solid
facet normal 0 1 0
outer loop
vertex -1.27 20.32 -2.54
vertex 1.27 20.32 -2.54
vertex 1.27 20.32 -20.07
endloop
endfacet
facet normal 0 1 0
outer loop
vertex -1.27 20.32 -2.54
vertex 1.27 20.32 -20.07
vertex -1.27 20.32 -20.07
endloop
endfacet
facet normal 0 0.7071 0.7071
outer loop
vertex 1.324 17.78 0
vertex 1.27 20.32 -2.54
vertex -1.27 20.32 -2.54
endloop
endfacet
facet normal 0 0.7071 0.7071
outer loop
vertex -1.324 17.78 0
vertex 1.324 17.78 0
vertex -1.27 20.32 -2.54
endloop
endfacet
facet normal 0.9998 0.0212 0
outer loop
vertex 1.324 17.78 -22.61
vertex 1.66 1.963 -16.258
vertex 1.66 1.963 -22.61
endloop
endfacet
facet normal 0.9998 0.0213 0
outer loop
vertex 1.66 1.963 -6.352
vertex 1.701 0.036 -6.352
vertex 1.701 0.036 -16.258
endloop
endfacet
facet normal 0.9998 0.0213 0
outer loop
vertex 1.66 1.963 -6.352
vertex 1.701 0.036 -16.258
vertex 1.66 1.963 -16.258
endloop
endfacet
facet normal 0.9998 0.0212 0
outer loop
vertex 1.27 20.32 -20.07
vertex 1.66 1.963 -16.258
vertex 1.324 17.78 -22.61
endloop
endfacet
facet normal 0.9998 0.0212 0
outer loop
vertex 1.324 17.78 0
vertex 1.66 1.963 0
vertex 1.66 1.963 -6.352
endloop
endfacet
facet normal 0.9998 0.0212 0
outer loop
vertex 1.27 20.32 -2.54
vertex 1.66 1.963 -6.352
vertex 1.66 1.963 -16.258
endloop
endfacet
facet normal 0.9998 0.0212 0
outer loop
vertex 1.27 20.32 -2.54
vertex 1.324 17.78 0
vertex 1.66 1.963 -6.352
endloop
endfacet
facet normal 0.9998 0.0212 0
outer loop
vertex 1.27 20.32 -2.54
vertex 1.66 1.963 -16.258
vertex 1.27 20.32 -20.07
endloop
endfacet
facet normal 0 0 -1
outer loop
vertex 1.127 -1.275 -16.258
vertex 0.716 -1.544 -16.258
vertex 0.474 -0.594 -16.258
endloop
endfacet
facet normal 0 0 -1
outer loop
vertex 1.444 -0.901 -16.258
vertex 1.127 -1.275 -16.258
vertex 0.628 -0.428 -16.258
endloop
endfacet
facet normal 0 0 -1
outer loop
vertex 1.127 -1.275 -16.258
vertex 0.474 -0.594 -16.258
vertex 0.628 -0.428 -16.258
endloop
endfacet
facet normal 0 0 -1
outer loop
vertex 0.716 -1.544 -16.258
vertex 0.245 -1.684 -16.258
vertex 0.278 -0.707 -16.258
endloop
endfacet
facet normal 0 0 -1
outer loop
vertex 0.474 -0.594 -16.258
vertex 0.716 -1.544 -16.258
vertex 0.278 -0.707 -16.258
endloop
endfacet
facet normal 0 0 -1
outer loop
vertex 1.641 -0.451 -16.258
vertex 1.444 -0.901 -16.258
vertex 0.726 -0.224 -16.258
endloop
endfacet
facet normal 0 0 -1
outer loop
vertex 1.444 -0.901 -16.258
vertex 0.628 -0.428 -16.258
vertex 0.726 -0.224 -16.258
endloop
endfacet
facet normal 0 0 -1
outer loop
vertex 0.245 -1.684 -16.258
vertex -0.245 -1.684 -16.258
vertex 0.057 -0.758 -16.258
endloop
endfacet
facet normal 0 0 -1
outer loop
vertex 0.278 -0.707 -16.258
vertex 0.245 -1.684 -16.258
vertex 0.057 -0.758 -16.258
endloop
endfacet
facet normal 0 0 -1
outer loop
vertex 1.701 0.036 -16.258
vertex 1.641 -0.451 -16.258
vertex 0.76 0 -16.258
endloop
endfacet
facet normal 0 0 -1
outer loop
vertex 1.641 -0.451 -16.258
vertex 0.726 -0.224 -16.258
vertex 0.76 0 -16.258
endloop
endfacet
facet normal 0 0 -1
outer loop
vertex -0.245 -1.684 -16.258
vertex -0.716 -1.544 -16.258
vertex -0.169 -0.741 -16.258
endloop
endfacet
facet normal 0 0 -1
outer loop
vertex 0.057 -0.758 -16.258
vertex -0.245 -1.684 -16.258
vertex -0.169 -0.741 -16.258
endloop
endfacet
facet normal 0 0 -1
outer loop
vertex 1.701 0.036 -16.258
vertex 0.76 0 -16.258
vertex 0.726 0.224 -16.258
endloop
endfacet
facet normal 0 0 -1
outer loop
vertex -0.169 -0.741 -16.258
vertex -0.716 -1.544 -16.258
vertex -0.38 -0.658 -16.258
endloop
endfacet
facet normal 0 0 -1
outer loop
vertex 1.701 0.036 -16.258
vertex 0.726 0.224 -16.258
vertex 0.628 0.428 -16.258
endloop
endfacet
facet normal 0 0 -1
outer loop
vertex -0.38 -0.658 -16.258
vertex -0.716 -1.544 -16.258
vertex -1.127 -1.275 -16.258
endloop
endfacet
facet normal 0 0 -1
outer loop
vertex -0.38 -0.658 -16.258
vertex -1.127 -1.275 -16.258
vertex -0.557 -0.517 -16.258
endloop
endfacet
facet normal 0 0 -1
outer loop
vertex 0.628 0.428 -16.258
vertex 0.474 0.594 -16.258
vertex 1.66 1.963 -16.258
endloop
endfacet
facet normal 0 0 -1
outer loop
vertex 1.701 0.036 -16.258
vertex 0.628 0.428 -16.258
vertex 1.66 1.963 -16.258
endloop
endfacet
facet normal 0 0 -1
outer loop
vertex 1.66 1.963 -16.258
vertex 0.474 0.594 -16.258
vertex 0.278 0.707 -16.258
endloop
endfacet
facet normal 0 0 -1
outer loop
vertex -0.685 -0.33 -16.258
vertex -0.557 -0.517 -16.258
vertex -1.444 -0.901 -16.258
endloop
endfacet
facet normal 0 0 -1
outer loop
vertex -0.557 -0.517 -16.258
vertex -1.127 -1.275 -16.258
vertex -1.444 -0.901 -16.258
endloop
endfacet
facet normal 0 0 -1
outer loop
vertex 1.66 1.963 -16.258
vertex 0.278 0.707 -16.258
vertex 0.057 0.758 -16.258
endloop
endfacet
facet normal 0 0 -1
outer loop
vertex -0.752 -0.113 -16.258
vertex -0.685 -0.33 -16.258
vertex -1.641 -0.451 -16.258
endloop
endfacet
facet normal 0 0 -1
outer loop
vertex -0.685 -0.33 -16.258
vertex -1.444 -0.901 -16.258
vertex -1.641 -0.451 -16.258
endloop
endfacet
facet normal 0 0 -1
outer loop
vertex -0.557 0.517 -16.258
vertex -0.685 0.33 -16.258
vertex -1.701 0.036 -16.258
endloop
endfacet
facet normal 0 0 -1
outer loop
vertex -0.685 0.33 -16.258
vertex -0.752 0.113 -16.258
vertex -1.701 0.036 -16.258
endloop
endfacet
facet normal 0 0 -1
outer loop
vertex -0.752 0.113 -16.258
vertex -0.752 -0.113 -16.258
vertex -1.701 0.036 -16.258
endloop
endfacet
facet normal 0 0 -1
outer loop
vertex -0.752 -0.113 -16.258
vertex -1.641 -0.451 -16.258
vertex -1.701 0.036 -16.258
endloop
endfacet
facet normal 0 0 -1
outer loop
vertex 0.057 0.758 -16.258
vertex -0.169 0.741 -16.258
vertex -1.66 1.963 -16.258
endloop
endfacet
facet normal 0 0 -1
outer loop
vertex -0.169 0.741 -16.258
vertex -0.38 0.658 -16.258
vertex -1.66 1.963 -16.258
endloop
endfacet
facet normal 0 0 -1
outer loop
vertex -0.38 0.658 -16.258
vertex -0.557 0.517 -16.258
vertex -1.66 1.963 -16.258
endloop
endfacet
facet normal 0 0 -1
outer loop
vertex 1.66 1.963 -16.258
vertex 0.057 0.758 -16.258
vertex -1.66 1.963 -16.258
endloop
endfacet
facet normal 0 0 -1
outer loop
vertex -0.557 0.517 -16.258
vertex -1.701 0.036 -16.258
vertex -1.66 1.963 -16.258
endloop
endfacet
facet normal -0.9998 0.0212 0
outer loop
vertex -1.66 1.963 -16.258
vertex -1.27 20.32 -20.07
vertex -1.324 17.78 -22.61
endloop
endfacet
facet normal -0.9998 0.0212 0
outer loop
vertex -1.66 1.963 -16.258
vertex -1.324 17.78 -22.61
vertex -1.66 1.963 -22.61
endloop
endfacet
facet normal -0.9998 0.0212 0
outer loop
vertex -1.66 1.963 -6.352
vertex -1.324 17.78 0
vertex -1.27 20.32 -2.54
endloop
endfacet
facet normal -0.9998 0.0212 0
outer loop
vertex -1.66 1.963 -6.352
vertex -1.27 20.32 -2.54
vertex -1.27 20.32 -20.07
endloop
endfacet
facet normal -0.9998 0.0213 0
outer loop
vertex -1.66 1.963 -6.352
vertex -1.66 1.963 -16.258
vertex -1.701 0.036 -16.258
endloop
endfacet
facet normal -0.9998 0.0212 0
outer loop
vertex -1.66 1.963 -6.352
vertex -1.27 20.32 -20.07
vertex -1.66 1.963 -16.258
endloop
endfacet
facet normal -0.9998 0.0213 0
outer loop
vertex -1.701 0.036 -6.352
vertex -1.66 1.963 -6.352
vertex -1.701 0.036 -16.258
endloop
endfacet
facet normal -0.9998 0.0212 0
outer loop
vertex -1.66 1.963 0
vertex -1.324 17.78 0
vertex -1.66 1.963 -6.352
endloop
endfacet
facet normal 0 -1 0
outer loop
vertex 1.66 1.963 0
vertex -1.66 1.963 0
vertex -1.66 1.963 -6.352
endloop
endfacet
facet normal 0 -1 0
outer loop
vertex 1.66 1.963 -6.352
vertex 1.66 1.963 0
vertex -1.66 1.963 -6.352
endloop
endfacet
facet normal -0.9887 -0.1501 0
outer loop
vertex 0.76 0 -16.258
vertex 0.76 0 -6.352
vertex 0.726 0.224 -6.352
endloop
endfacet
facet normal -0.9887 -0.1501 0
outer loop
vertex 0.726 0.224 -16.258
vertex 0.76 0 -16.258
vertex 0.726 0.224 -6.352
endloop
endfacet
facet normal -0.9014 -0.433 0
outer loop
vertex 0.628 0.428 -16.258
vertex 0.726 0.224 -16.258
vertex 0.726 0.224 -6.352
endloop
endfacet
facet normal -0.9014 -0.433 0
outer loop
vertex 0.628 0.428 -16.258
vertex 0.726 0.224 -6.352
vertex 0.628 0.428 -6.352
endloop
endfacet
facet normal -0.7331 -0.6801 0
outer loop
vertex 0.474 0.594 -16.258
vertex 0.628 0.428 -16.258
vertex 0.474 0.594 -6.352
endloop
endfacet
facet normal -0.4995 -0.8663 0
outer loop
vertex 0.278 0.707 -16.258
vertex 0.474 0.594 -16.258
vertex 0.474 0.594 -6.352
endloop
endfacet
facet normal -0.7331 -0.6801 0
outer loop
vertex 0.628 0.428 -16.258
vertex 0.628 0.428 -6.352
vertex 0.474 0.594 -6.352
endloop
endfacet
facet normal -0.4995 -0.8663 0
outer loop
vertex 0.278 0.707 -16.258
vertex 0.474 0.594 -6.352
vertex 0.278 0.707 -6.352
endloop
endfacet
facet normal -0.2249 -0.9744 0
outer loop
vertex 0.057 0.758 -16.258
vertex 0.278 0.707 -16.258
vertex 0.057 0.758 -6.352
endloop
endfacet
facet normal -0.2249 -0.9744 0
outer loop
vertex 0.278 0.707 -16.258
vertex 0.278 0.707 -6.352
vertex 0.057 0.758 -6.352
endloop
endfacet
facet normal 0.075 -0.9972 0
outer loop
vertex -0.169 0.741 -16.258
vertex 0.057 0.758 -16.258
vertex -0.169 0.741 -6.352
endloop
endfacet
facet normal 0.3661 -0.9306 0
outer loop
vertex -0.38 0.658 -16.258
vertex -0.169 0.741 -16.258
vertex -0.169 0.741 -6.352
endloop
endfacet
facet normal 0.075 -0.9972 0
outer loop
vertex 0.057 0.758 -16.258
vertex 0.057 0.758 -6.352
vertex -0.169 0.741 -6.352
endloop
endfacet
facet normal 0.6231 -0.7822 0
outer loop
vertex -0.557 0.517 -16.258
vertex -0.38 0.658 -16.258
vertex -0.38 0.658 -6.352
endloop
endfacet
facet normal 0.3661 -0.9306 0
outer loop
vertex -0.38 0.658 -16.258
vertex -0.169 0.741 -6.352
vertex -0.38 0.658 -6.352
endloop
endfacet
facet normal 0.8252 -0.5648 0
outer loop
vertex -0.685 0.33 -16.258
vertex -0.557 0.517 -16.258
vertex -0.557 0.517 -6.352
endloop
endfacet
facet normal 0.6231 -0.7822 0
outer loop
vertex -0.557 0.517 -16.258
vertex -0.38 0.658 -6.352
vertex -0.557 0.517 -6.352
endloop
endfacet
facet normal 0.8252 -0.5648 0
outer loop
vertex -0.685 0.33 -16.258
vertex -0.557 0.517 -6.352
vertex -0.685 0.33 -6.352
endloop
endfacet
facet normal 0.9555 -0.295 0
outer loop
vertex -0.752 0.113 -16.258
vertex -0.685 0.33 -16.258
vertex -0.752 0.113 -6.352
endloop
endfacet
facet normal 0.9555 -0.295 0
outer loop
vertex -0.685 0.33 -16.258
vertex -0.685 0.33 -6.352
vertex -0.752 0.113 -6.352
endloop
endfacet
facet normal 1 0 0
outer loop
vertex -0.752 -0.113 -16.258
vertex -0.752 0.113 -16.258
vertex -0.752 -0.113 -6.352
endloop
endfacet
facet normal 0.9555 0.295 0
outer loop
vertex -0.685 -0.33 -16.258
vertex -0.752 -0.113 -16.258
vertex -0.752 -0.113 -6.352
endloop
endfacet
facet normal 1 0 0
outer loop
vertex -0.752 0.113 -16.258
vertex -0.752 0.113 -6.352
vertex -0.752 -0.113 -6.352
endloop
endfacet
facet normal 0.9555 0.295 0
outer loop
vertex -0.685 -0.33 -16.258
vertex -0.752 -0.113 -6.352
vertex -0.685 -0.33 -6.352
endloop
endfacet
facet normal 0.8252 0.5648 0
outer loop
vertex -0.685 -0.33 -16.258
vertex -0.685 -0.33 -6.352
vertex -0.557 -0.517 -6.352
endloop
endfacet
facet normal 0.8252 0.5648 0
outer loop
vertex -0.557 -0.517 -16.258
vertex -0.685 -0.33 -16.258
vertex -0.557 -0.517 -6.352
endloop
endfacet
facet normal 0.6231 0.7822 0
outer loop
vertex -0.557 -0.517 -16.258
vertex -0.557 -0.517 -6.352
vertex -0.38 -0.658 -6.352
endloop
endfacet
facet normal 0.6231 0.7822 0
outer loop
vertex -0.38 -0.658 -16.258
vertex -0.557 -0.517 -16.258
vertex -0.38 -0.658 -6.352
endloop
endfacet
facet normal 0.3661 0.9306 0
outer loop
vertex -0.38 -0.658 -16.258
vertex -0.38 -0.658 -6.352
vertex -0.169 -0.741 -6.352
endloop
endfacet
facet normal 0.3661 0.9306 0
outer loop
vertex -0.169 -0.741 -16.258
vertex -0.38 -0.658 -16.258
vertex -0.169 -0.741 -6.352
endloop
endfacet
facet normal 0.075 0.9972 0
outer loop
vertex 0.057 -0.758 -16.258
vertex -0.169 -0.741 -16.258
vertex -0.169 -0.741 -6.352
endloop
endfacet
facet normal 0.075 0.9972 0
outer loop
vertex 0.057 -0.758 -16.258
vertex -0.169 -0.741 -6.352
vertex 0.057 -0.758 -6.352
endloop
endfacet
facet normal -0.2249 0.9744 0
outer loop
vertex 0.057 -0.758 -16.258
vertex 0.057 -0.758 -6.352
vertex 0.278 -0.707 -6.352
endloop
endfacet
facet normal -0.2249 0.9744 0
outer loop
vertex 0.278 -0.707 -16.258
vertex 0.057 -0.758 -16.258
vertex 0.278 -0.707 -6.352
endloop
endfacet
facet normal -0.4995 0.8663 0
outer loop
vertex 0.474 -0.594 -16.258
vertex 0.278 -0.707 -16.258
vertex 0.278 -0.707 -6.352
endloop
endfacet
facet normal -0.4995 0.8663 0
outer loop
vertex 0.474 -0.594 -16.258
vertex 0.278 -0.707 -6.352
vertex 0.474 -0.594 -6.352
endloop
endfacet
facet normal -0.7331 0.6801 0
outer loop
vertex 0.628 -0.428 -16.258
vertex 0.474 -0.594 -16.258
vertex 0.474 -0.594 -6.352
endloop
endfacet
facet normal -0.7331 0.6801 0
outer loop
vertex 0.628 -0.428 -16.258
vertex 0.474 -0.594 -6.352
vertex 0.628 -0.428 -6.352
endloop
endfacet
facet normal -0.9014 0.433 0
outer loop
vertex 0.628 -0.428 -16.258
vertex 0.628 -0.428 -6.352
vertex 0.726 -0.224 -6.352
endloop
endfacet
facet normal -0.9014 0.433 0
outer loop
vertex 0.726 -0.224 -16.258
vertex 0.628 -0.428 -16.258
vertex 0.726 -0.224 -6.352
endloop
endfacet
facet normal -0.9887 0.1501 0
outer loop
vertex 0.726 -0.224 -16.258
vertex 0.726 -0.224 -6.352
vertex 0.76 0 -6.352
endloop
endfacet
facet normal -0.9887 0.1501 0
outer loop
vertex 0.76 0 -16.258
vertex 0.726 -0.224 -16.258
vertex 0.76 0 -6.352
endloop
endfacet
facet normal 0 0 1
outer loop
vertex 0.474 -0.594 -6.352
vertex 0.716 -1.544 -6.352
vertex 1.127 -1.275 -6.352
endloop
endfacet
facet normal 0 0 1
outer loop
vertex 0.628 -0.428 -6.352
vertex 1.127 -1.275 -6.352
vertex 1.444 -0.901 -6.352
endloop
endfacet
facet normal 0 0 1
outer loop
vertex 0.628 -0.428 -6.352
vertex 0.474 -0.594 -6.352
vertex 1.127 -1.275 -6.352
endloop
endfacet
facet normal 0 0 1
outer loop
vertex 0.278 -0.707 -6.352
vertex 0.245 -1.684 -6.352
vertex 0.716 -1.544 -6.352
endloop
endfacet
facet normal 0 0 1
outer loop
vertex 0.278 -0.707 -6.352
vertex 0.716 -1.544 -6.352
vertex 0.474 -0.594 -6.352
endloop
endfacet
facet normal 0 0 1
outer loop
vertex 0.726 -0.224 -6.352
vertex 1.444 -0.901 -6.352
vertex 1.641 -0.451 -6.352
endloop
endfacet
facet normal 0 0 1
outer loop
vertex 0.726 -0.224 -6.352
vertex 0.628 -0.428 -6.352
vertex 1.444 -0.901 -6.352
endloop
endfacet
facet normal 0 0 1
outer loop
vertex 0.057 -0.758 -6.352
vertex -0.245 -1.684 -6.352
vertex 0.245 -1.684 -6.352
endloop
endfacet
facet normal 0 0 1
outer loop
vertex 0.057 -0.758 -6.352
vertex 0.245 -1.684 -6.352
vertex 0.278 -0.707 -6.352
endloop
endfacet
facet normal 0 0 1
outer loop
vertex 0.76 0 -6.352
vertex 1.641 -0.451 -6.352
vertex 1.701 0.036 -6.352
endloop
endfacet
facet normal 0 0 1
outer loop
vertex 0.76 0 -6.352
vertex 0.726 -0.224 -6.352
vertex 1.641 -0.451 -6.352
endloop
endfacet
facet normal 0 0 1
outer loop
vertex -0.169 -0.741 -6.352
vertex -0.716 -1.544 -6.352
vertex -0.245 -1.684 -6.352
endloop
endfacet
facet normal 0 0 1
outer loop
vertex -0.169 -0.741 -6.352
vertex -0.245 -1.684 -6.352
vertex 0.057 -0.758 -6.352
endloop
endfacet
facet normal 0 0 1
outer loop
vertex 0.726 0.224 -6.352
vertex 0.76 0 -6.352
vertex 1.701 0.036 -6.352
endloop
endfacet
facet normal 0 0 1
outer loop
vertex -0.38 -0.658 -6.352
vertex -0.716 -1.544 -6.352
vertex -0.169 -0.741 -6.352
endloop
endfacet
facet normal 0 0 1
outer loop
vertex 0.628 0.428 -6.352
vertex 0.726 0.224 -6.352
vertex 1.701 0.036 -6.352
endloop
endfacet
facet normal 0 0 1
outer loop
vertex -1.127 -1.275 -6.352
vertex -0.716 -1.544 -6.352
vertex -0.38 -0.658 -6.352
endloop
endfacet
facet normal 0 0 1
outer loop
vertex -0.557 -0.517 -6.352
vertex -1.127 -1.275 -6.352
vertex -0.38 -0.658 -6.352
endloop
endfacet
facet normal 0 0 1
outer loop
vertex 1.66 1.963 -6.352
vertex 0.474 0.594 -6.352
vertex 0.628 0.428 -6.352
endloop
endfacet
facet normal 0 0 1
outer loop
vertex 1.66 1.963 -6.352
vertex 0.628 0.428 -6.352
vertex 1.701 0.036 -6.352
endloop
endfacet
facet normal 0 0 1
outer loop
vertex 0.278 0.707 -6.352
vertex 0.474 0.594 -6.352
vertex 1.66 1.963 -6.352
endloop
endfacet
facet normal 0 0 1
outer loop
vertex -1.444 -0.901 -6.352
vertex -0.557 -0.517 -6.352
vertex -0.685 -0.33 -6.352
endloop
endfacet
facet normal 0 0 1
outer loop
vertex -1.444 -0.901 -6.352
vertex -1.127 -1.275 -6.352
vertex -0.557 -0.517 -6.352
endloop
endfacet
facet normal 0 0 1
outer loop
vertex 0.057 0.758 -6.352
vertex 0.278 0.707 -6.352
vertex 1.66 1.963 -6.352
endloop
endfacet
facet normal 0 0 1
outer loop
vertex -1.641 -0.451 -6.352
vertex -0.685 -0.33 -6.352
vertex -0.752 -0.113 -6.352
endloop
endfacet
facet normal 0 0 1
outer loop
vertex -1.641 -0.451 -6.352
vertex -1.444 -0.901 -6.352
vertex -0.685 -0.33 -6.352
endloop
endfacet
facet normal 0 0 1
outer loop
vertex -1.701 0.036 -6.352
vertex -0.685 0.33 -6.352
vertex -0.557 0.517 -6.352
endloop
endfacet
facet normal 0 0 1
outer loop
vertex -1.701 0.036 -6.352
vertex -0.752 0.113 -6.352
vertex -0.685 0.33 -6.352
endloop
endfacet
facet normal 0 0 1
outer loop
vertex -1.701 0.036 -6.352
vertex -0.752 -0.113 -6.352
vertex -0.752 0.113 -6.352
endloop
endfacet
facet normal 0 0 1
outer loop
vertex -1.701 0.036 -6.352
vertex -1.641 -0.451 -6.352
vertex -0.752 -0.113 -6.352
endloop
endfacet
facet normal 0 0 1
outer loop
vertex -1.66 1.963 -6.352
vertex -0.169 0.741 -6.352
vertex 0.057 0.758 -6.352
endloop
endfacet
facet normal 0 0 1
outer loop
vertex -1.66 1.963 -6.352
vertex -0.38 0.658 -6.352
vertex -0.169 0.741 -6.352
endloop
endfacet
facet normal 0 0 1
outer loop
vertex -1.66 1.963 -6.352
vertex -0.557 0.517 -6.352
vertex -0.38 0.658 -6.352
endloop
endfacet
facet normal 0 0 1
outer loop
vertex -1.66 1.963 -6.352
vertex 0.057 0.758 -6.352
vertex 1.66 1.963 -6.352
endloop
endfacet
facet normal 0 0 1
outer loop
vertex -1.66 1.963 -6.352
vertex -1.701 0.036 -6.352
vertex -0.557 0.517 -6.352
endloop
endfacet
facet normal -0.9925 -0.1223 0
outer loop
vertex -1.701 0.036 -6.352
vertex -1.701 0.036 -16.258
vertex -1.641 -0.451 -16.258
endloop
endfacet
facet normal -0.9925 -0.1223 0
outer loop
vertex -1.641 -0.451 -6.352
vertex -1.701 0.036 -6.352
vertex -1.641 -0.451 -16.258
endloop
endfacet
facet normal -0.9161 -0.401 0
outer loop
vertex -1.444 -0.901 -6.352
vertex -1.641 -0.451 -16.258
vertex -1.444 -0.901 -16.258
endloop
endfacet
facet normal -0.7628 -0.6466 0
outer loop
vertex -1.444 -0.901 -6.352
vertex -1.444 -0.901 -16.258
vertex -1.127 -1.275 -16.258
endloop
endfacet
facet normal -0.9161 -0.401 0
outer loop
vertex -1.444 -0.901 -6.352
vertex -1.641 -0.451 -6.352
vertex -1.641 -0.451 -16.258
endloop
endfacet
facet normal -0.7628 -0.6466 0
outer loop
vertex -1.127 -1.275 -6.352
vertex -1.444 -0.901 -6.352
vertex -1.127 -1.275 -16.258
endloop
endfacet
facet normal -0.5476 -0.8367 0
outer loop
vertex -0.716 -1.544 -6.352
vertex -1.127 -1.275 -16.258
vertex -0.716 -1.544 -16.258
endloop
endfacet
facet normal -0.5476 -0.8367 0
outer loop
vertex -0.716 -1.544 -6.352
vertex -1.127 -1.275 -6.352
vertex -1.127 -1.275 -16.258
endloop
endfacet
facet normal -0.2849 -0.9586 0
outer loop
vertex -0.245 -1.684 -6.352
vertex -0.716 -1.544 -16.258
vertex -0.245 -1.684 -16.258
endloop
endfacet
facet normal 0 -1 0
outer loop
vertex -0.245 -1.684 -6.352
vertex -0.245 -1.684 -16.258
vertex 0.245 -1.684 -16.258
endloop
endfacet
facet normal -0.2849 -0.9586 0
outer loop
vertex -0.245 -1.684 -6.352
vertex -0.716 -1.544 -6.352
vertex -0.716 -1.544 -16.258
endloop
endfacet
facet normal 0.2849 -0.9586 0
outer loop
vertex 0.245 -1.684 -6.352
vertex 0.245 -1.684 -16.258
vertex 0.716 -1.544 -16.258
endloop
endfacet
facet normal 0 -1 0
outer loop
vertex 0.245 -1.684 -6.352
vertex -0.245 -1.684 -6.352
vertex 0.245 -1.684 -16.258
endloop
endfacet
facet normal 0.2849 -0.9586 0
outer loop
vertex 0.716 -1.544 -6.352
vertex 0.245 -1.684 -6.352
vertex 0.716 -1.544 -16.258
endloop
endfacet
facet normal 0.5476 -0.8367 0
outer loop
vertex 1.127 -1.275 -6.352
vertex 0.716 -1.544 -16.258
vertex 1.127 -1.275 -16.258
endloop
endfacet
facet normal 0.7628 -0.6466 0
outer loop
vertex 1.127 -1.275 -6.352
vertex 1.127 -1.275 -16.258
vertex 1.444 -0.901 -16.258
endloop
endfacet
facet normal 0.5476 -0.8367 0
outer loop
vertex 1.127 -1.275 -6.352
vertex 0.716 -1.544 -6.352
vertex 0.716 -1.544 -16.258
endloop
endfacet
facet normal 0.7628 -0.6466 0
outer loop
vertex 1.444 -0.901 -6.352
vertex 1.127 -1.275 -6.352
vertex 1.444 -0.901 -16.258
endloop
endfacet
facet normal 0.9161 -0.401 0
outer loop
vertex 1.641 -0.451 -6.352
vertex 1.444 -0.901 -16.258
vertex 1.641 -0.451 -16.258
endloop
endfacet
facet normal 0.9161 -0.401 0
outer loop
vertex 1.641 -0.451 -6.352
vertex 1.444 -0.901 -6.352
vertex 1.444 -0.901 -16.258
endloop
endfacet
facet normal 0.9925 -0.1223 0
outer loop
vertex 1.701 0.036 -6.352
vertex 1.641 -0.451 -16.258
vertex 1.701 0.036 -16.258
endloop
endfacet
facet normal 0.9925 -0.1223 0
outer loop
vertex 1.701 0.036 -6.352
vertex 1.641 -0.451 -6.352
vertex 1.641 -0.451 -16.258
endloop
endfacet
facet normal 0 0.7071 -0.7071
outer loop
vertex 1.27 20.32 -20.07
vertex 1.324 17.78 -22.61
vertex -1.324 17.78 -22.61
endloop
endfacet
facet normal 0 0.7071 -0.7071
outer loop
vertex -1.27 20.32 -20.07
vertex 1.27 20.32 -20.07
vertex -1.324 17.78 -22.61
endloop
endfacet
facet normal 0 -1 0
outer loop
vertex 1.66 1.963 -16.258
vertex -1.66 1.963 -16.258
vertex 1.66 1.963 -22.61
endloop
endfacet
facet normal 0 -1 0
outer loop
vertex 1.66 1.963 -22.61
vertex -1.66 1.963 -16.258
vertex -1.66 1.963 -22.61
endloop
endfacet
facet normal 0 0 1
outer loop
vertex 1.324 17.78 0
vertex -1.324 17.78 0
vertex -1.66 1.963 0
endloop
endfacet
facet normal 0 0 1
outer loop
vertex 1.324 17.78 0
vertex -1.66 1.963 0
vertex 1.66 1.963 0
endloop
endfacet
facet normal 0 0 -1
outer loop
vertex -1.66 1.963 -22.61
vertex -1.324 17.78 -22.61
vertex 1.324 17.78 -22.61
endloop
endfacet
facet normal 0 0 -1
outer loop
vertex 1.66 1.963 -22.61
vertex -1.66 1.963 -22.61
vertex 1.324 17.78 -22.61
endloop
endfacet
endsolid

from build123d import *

# Parameters (mm, degrees)
EXTRUDE1_DEPTH      = 22.61
CHAMFER1_SIZE       = 2.54
SKETCH2_R           = 0.76
CUT_EXTRUDE1_DEPTH  = 31.446849151
EXTRUDE2_DEPTH      = 31.446849151
EXTRUDE2_DEPTH_BACK = 31.446849151
SKETCH3_W           = 6.352
SKETCH3_H           = 3.664879672


with BuildPart() as part:
    # Sketch1 → Extrude1 (new body)
    with BuildSketch(Plane.XY):
        with BuildLine():
            Line((-1.27, 20.32), (-1.701415211, 0.036187299))
            ThreePointArc((-1.701415211, 0.036187299), (0, -1.7018), (1.701415211, 0.036187299))
            Line((1.701415211, 0.036187299), (1.27, 20.32))
            Line((1.27, 20.32), (-1.27, 20.32))
        make_face()
    extrude(amount=-EXTRUDE1_DEPTH)

    # Chamfer1
    chamfer1_edges = [part.edges().sort_by_distance(p)[0] for p in [
        (0, 20.32, -22.61),
        (0, 20.32, 0),
    ]]
    chamfer(chamfer1_edges, length=CHAMFER1_SIZE)

    # Sketch2 → Cut-Extrude1 (cut, through all)
    with BuildSketch(Plane.XY):
        Circle(SKETCH2_R)
    extrude(amount=-CUT_EXTRUDE1_DEPTH, mode=Mode.SUBTRACT)

    # Sketch3 → Extrude2 (cut, two sides: drawn at the far end of the back side and taken through both)
    with BuildSketch(Plane(origin=(0, 0, 0), x_dir=(0, 0, -1), z_dir=(1, 0, 0)).offset(-EXTRUDE2_DEPTH_BACK)):
        with Locations((3.176, 0.130639836)):
            Rectangle(SKETCH3_W, SKETCH3_H)
        with Locations((19.434, 0.130639836)):
            Rectangle(SKETCH3_W, SKETCH3_H)
    extrude(amount=EXTRUDE2_DEPTH + EXTRUDE2_DEPTH_BACK, mode=Mode.SUBTRACT)


solid = part.part
